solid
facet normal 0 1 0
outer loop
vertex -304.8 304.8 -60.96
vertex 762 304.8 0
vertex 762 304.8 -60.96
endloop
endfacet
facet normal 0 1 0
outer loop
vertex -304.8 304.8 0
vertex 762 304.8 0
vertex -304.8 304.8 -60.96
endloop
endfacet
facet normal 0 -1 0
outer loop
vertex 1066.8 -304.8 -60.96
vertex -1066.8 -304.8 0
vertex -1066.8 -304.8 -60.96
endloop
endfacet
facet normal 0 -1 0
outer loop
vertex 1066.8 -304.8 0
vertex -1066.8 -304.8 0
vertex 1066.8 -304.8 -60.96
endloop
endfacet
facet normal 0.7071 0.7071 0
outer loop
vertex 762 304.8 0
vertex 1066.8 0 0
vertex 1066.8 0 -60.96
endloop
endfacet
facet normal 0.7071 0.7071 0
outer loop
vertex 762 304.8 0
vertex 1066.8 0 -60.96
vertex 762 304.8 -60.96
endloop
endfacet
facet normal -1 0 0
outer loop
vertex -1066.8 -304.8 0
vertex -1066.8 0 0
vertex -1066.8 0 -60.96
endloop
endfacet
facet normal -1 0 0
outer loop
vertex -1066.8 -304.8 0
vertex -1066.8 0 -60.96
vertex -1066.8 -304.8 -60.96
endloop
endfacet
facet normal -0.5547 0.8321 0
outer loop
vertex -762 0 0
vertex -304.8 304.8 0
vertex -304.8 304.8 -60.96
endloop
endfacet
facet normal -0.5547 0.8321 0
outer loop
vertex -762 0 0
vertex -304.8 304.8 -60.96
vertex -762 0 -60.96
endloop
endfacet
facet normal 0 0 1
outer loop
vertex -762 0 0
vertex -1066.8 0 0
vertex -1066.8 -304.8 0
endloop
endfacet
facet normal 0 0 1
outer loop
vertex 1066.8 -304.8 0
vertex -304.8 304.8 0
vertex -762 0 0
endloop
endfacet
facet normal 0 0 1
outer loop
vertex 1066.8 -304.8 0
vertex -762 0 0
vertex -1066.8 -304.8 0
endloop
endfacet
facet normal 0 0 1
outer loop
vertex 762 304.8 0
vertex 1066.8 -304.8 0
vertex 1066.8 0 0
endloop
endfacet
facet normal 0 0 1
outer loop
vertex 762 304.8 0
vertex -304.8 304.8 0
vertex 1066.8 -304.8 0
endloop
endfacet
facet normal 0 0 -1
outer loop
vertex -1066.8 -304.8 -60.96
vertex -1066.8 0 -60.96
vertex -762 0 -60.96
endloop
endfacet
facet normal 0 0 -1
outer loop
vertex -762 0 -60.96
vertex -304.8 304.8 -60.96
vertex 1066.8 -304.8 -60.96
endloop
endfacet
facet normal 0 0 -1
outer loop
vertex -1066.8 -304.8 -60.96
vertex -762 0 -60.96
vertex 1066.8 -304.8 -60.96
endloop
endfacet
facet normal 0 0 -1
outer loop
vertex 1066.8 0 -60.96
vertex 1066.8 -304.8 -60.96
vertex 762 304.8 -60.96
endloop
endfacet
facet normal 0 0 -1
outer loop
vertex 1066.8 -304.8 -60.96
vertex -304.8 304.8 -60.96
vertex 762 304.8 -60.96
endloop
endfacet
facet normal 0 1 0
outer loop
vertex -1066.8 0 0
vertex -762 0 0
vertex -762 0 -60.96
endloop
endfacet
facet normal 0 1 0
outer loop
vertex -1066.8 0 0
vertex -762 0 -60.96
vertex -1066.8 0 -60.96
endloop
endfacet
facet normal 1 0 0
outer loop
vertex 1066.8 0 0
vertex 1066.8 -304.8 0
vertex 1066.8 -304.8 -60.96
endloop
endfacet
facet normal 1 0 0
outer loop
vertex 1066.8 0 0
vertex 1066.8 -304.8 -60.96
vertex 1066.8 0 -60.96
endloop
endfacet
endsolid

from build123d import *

# Parameters (mm, degrees)
F1_DEPTH = 60.96


with BuildPart() as f1:
    # F0 (on Top) → F1 (new body)
    with BuildSketch(Plane.XY):
        Polygon((1066.8, 0), (762, 304.8), (-304.8, 304.8), (-762, 0), (-1066.8, 0), (-1066.8, -304.8), (1066.8, -304.8), align=None)
    extrude(amount=-F1_DEPTH)


solid = f1.part
